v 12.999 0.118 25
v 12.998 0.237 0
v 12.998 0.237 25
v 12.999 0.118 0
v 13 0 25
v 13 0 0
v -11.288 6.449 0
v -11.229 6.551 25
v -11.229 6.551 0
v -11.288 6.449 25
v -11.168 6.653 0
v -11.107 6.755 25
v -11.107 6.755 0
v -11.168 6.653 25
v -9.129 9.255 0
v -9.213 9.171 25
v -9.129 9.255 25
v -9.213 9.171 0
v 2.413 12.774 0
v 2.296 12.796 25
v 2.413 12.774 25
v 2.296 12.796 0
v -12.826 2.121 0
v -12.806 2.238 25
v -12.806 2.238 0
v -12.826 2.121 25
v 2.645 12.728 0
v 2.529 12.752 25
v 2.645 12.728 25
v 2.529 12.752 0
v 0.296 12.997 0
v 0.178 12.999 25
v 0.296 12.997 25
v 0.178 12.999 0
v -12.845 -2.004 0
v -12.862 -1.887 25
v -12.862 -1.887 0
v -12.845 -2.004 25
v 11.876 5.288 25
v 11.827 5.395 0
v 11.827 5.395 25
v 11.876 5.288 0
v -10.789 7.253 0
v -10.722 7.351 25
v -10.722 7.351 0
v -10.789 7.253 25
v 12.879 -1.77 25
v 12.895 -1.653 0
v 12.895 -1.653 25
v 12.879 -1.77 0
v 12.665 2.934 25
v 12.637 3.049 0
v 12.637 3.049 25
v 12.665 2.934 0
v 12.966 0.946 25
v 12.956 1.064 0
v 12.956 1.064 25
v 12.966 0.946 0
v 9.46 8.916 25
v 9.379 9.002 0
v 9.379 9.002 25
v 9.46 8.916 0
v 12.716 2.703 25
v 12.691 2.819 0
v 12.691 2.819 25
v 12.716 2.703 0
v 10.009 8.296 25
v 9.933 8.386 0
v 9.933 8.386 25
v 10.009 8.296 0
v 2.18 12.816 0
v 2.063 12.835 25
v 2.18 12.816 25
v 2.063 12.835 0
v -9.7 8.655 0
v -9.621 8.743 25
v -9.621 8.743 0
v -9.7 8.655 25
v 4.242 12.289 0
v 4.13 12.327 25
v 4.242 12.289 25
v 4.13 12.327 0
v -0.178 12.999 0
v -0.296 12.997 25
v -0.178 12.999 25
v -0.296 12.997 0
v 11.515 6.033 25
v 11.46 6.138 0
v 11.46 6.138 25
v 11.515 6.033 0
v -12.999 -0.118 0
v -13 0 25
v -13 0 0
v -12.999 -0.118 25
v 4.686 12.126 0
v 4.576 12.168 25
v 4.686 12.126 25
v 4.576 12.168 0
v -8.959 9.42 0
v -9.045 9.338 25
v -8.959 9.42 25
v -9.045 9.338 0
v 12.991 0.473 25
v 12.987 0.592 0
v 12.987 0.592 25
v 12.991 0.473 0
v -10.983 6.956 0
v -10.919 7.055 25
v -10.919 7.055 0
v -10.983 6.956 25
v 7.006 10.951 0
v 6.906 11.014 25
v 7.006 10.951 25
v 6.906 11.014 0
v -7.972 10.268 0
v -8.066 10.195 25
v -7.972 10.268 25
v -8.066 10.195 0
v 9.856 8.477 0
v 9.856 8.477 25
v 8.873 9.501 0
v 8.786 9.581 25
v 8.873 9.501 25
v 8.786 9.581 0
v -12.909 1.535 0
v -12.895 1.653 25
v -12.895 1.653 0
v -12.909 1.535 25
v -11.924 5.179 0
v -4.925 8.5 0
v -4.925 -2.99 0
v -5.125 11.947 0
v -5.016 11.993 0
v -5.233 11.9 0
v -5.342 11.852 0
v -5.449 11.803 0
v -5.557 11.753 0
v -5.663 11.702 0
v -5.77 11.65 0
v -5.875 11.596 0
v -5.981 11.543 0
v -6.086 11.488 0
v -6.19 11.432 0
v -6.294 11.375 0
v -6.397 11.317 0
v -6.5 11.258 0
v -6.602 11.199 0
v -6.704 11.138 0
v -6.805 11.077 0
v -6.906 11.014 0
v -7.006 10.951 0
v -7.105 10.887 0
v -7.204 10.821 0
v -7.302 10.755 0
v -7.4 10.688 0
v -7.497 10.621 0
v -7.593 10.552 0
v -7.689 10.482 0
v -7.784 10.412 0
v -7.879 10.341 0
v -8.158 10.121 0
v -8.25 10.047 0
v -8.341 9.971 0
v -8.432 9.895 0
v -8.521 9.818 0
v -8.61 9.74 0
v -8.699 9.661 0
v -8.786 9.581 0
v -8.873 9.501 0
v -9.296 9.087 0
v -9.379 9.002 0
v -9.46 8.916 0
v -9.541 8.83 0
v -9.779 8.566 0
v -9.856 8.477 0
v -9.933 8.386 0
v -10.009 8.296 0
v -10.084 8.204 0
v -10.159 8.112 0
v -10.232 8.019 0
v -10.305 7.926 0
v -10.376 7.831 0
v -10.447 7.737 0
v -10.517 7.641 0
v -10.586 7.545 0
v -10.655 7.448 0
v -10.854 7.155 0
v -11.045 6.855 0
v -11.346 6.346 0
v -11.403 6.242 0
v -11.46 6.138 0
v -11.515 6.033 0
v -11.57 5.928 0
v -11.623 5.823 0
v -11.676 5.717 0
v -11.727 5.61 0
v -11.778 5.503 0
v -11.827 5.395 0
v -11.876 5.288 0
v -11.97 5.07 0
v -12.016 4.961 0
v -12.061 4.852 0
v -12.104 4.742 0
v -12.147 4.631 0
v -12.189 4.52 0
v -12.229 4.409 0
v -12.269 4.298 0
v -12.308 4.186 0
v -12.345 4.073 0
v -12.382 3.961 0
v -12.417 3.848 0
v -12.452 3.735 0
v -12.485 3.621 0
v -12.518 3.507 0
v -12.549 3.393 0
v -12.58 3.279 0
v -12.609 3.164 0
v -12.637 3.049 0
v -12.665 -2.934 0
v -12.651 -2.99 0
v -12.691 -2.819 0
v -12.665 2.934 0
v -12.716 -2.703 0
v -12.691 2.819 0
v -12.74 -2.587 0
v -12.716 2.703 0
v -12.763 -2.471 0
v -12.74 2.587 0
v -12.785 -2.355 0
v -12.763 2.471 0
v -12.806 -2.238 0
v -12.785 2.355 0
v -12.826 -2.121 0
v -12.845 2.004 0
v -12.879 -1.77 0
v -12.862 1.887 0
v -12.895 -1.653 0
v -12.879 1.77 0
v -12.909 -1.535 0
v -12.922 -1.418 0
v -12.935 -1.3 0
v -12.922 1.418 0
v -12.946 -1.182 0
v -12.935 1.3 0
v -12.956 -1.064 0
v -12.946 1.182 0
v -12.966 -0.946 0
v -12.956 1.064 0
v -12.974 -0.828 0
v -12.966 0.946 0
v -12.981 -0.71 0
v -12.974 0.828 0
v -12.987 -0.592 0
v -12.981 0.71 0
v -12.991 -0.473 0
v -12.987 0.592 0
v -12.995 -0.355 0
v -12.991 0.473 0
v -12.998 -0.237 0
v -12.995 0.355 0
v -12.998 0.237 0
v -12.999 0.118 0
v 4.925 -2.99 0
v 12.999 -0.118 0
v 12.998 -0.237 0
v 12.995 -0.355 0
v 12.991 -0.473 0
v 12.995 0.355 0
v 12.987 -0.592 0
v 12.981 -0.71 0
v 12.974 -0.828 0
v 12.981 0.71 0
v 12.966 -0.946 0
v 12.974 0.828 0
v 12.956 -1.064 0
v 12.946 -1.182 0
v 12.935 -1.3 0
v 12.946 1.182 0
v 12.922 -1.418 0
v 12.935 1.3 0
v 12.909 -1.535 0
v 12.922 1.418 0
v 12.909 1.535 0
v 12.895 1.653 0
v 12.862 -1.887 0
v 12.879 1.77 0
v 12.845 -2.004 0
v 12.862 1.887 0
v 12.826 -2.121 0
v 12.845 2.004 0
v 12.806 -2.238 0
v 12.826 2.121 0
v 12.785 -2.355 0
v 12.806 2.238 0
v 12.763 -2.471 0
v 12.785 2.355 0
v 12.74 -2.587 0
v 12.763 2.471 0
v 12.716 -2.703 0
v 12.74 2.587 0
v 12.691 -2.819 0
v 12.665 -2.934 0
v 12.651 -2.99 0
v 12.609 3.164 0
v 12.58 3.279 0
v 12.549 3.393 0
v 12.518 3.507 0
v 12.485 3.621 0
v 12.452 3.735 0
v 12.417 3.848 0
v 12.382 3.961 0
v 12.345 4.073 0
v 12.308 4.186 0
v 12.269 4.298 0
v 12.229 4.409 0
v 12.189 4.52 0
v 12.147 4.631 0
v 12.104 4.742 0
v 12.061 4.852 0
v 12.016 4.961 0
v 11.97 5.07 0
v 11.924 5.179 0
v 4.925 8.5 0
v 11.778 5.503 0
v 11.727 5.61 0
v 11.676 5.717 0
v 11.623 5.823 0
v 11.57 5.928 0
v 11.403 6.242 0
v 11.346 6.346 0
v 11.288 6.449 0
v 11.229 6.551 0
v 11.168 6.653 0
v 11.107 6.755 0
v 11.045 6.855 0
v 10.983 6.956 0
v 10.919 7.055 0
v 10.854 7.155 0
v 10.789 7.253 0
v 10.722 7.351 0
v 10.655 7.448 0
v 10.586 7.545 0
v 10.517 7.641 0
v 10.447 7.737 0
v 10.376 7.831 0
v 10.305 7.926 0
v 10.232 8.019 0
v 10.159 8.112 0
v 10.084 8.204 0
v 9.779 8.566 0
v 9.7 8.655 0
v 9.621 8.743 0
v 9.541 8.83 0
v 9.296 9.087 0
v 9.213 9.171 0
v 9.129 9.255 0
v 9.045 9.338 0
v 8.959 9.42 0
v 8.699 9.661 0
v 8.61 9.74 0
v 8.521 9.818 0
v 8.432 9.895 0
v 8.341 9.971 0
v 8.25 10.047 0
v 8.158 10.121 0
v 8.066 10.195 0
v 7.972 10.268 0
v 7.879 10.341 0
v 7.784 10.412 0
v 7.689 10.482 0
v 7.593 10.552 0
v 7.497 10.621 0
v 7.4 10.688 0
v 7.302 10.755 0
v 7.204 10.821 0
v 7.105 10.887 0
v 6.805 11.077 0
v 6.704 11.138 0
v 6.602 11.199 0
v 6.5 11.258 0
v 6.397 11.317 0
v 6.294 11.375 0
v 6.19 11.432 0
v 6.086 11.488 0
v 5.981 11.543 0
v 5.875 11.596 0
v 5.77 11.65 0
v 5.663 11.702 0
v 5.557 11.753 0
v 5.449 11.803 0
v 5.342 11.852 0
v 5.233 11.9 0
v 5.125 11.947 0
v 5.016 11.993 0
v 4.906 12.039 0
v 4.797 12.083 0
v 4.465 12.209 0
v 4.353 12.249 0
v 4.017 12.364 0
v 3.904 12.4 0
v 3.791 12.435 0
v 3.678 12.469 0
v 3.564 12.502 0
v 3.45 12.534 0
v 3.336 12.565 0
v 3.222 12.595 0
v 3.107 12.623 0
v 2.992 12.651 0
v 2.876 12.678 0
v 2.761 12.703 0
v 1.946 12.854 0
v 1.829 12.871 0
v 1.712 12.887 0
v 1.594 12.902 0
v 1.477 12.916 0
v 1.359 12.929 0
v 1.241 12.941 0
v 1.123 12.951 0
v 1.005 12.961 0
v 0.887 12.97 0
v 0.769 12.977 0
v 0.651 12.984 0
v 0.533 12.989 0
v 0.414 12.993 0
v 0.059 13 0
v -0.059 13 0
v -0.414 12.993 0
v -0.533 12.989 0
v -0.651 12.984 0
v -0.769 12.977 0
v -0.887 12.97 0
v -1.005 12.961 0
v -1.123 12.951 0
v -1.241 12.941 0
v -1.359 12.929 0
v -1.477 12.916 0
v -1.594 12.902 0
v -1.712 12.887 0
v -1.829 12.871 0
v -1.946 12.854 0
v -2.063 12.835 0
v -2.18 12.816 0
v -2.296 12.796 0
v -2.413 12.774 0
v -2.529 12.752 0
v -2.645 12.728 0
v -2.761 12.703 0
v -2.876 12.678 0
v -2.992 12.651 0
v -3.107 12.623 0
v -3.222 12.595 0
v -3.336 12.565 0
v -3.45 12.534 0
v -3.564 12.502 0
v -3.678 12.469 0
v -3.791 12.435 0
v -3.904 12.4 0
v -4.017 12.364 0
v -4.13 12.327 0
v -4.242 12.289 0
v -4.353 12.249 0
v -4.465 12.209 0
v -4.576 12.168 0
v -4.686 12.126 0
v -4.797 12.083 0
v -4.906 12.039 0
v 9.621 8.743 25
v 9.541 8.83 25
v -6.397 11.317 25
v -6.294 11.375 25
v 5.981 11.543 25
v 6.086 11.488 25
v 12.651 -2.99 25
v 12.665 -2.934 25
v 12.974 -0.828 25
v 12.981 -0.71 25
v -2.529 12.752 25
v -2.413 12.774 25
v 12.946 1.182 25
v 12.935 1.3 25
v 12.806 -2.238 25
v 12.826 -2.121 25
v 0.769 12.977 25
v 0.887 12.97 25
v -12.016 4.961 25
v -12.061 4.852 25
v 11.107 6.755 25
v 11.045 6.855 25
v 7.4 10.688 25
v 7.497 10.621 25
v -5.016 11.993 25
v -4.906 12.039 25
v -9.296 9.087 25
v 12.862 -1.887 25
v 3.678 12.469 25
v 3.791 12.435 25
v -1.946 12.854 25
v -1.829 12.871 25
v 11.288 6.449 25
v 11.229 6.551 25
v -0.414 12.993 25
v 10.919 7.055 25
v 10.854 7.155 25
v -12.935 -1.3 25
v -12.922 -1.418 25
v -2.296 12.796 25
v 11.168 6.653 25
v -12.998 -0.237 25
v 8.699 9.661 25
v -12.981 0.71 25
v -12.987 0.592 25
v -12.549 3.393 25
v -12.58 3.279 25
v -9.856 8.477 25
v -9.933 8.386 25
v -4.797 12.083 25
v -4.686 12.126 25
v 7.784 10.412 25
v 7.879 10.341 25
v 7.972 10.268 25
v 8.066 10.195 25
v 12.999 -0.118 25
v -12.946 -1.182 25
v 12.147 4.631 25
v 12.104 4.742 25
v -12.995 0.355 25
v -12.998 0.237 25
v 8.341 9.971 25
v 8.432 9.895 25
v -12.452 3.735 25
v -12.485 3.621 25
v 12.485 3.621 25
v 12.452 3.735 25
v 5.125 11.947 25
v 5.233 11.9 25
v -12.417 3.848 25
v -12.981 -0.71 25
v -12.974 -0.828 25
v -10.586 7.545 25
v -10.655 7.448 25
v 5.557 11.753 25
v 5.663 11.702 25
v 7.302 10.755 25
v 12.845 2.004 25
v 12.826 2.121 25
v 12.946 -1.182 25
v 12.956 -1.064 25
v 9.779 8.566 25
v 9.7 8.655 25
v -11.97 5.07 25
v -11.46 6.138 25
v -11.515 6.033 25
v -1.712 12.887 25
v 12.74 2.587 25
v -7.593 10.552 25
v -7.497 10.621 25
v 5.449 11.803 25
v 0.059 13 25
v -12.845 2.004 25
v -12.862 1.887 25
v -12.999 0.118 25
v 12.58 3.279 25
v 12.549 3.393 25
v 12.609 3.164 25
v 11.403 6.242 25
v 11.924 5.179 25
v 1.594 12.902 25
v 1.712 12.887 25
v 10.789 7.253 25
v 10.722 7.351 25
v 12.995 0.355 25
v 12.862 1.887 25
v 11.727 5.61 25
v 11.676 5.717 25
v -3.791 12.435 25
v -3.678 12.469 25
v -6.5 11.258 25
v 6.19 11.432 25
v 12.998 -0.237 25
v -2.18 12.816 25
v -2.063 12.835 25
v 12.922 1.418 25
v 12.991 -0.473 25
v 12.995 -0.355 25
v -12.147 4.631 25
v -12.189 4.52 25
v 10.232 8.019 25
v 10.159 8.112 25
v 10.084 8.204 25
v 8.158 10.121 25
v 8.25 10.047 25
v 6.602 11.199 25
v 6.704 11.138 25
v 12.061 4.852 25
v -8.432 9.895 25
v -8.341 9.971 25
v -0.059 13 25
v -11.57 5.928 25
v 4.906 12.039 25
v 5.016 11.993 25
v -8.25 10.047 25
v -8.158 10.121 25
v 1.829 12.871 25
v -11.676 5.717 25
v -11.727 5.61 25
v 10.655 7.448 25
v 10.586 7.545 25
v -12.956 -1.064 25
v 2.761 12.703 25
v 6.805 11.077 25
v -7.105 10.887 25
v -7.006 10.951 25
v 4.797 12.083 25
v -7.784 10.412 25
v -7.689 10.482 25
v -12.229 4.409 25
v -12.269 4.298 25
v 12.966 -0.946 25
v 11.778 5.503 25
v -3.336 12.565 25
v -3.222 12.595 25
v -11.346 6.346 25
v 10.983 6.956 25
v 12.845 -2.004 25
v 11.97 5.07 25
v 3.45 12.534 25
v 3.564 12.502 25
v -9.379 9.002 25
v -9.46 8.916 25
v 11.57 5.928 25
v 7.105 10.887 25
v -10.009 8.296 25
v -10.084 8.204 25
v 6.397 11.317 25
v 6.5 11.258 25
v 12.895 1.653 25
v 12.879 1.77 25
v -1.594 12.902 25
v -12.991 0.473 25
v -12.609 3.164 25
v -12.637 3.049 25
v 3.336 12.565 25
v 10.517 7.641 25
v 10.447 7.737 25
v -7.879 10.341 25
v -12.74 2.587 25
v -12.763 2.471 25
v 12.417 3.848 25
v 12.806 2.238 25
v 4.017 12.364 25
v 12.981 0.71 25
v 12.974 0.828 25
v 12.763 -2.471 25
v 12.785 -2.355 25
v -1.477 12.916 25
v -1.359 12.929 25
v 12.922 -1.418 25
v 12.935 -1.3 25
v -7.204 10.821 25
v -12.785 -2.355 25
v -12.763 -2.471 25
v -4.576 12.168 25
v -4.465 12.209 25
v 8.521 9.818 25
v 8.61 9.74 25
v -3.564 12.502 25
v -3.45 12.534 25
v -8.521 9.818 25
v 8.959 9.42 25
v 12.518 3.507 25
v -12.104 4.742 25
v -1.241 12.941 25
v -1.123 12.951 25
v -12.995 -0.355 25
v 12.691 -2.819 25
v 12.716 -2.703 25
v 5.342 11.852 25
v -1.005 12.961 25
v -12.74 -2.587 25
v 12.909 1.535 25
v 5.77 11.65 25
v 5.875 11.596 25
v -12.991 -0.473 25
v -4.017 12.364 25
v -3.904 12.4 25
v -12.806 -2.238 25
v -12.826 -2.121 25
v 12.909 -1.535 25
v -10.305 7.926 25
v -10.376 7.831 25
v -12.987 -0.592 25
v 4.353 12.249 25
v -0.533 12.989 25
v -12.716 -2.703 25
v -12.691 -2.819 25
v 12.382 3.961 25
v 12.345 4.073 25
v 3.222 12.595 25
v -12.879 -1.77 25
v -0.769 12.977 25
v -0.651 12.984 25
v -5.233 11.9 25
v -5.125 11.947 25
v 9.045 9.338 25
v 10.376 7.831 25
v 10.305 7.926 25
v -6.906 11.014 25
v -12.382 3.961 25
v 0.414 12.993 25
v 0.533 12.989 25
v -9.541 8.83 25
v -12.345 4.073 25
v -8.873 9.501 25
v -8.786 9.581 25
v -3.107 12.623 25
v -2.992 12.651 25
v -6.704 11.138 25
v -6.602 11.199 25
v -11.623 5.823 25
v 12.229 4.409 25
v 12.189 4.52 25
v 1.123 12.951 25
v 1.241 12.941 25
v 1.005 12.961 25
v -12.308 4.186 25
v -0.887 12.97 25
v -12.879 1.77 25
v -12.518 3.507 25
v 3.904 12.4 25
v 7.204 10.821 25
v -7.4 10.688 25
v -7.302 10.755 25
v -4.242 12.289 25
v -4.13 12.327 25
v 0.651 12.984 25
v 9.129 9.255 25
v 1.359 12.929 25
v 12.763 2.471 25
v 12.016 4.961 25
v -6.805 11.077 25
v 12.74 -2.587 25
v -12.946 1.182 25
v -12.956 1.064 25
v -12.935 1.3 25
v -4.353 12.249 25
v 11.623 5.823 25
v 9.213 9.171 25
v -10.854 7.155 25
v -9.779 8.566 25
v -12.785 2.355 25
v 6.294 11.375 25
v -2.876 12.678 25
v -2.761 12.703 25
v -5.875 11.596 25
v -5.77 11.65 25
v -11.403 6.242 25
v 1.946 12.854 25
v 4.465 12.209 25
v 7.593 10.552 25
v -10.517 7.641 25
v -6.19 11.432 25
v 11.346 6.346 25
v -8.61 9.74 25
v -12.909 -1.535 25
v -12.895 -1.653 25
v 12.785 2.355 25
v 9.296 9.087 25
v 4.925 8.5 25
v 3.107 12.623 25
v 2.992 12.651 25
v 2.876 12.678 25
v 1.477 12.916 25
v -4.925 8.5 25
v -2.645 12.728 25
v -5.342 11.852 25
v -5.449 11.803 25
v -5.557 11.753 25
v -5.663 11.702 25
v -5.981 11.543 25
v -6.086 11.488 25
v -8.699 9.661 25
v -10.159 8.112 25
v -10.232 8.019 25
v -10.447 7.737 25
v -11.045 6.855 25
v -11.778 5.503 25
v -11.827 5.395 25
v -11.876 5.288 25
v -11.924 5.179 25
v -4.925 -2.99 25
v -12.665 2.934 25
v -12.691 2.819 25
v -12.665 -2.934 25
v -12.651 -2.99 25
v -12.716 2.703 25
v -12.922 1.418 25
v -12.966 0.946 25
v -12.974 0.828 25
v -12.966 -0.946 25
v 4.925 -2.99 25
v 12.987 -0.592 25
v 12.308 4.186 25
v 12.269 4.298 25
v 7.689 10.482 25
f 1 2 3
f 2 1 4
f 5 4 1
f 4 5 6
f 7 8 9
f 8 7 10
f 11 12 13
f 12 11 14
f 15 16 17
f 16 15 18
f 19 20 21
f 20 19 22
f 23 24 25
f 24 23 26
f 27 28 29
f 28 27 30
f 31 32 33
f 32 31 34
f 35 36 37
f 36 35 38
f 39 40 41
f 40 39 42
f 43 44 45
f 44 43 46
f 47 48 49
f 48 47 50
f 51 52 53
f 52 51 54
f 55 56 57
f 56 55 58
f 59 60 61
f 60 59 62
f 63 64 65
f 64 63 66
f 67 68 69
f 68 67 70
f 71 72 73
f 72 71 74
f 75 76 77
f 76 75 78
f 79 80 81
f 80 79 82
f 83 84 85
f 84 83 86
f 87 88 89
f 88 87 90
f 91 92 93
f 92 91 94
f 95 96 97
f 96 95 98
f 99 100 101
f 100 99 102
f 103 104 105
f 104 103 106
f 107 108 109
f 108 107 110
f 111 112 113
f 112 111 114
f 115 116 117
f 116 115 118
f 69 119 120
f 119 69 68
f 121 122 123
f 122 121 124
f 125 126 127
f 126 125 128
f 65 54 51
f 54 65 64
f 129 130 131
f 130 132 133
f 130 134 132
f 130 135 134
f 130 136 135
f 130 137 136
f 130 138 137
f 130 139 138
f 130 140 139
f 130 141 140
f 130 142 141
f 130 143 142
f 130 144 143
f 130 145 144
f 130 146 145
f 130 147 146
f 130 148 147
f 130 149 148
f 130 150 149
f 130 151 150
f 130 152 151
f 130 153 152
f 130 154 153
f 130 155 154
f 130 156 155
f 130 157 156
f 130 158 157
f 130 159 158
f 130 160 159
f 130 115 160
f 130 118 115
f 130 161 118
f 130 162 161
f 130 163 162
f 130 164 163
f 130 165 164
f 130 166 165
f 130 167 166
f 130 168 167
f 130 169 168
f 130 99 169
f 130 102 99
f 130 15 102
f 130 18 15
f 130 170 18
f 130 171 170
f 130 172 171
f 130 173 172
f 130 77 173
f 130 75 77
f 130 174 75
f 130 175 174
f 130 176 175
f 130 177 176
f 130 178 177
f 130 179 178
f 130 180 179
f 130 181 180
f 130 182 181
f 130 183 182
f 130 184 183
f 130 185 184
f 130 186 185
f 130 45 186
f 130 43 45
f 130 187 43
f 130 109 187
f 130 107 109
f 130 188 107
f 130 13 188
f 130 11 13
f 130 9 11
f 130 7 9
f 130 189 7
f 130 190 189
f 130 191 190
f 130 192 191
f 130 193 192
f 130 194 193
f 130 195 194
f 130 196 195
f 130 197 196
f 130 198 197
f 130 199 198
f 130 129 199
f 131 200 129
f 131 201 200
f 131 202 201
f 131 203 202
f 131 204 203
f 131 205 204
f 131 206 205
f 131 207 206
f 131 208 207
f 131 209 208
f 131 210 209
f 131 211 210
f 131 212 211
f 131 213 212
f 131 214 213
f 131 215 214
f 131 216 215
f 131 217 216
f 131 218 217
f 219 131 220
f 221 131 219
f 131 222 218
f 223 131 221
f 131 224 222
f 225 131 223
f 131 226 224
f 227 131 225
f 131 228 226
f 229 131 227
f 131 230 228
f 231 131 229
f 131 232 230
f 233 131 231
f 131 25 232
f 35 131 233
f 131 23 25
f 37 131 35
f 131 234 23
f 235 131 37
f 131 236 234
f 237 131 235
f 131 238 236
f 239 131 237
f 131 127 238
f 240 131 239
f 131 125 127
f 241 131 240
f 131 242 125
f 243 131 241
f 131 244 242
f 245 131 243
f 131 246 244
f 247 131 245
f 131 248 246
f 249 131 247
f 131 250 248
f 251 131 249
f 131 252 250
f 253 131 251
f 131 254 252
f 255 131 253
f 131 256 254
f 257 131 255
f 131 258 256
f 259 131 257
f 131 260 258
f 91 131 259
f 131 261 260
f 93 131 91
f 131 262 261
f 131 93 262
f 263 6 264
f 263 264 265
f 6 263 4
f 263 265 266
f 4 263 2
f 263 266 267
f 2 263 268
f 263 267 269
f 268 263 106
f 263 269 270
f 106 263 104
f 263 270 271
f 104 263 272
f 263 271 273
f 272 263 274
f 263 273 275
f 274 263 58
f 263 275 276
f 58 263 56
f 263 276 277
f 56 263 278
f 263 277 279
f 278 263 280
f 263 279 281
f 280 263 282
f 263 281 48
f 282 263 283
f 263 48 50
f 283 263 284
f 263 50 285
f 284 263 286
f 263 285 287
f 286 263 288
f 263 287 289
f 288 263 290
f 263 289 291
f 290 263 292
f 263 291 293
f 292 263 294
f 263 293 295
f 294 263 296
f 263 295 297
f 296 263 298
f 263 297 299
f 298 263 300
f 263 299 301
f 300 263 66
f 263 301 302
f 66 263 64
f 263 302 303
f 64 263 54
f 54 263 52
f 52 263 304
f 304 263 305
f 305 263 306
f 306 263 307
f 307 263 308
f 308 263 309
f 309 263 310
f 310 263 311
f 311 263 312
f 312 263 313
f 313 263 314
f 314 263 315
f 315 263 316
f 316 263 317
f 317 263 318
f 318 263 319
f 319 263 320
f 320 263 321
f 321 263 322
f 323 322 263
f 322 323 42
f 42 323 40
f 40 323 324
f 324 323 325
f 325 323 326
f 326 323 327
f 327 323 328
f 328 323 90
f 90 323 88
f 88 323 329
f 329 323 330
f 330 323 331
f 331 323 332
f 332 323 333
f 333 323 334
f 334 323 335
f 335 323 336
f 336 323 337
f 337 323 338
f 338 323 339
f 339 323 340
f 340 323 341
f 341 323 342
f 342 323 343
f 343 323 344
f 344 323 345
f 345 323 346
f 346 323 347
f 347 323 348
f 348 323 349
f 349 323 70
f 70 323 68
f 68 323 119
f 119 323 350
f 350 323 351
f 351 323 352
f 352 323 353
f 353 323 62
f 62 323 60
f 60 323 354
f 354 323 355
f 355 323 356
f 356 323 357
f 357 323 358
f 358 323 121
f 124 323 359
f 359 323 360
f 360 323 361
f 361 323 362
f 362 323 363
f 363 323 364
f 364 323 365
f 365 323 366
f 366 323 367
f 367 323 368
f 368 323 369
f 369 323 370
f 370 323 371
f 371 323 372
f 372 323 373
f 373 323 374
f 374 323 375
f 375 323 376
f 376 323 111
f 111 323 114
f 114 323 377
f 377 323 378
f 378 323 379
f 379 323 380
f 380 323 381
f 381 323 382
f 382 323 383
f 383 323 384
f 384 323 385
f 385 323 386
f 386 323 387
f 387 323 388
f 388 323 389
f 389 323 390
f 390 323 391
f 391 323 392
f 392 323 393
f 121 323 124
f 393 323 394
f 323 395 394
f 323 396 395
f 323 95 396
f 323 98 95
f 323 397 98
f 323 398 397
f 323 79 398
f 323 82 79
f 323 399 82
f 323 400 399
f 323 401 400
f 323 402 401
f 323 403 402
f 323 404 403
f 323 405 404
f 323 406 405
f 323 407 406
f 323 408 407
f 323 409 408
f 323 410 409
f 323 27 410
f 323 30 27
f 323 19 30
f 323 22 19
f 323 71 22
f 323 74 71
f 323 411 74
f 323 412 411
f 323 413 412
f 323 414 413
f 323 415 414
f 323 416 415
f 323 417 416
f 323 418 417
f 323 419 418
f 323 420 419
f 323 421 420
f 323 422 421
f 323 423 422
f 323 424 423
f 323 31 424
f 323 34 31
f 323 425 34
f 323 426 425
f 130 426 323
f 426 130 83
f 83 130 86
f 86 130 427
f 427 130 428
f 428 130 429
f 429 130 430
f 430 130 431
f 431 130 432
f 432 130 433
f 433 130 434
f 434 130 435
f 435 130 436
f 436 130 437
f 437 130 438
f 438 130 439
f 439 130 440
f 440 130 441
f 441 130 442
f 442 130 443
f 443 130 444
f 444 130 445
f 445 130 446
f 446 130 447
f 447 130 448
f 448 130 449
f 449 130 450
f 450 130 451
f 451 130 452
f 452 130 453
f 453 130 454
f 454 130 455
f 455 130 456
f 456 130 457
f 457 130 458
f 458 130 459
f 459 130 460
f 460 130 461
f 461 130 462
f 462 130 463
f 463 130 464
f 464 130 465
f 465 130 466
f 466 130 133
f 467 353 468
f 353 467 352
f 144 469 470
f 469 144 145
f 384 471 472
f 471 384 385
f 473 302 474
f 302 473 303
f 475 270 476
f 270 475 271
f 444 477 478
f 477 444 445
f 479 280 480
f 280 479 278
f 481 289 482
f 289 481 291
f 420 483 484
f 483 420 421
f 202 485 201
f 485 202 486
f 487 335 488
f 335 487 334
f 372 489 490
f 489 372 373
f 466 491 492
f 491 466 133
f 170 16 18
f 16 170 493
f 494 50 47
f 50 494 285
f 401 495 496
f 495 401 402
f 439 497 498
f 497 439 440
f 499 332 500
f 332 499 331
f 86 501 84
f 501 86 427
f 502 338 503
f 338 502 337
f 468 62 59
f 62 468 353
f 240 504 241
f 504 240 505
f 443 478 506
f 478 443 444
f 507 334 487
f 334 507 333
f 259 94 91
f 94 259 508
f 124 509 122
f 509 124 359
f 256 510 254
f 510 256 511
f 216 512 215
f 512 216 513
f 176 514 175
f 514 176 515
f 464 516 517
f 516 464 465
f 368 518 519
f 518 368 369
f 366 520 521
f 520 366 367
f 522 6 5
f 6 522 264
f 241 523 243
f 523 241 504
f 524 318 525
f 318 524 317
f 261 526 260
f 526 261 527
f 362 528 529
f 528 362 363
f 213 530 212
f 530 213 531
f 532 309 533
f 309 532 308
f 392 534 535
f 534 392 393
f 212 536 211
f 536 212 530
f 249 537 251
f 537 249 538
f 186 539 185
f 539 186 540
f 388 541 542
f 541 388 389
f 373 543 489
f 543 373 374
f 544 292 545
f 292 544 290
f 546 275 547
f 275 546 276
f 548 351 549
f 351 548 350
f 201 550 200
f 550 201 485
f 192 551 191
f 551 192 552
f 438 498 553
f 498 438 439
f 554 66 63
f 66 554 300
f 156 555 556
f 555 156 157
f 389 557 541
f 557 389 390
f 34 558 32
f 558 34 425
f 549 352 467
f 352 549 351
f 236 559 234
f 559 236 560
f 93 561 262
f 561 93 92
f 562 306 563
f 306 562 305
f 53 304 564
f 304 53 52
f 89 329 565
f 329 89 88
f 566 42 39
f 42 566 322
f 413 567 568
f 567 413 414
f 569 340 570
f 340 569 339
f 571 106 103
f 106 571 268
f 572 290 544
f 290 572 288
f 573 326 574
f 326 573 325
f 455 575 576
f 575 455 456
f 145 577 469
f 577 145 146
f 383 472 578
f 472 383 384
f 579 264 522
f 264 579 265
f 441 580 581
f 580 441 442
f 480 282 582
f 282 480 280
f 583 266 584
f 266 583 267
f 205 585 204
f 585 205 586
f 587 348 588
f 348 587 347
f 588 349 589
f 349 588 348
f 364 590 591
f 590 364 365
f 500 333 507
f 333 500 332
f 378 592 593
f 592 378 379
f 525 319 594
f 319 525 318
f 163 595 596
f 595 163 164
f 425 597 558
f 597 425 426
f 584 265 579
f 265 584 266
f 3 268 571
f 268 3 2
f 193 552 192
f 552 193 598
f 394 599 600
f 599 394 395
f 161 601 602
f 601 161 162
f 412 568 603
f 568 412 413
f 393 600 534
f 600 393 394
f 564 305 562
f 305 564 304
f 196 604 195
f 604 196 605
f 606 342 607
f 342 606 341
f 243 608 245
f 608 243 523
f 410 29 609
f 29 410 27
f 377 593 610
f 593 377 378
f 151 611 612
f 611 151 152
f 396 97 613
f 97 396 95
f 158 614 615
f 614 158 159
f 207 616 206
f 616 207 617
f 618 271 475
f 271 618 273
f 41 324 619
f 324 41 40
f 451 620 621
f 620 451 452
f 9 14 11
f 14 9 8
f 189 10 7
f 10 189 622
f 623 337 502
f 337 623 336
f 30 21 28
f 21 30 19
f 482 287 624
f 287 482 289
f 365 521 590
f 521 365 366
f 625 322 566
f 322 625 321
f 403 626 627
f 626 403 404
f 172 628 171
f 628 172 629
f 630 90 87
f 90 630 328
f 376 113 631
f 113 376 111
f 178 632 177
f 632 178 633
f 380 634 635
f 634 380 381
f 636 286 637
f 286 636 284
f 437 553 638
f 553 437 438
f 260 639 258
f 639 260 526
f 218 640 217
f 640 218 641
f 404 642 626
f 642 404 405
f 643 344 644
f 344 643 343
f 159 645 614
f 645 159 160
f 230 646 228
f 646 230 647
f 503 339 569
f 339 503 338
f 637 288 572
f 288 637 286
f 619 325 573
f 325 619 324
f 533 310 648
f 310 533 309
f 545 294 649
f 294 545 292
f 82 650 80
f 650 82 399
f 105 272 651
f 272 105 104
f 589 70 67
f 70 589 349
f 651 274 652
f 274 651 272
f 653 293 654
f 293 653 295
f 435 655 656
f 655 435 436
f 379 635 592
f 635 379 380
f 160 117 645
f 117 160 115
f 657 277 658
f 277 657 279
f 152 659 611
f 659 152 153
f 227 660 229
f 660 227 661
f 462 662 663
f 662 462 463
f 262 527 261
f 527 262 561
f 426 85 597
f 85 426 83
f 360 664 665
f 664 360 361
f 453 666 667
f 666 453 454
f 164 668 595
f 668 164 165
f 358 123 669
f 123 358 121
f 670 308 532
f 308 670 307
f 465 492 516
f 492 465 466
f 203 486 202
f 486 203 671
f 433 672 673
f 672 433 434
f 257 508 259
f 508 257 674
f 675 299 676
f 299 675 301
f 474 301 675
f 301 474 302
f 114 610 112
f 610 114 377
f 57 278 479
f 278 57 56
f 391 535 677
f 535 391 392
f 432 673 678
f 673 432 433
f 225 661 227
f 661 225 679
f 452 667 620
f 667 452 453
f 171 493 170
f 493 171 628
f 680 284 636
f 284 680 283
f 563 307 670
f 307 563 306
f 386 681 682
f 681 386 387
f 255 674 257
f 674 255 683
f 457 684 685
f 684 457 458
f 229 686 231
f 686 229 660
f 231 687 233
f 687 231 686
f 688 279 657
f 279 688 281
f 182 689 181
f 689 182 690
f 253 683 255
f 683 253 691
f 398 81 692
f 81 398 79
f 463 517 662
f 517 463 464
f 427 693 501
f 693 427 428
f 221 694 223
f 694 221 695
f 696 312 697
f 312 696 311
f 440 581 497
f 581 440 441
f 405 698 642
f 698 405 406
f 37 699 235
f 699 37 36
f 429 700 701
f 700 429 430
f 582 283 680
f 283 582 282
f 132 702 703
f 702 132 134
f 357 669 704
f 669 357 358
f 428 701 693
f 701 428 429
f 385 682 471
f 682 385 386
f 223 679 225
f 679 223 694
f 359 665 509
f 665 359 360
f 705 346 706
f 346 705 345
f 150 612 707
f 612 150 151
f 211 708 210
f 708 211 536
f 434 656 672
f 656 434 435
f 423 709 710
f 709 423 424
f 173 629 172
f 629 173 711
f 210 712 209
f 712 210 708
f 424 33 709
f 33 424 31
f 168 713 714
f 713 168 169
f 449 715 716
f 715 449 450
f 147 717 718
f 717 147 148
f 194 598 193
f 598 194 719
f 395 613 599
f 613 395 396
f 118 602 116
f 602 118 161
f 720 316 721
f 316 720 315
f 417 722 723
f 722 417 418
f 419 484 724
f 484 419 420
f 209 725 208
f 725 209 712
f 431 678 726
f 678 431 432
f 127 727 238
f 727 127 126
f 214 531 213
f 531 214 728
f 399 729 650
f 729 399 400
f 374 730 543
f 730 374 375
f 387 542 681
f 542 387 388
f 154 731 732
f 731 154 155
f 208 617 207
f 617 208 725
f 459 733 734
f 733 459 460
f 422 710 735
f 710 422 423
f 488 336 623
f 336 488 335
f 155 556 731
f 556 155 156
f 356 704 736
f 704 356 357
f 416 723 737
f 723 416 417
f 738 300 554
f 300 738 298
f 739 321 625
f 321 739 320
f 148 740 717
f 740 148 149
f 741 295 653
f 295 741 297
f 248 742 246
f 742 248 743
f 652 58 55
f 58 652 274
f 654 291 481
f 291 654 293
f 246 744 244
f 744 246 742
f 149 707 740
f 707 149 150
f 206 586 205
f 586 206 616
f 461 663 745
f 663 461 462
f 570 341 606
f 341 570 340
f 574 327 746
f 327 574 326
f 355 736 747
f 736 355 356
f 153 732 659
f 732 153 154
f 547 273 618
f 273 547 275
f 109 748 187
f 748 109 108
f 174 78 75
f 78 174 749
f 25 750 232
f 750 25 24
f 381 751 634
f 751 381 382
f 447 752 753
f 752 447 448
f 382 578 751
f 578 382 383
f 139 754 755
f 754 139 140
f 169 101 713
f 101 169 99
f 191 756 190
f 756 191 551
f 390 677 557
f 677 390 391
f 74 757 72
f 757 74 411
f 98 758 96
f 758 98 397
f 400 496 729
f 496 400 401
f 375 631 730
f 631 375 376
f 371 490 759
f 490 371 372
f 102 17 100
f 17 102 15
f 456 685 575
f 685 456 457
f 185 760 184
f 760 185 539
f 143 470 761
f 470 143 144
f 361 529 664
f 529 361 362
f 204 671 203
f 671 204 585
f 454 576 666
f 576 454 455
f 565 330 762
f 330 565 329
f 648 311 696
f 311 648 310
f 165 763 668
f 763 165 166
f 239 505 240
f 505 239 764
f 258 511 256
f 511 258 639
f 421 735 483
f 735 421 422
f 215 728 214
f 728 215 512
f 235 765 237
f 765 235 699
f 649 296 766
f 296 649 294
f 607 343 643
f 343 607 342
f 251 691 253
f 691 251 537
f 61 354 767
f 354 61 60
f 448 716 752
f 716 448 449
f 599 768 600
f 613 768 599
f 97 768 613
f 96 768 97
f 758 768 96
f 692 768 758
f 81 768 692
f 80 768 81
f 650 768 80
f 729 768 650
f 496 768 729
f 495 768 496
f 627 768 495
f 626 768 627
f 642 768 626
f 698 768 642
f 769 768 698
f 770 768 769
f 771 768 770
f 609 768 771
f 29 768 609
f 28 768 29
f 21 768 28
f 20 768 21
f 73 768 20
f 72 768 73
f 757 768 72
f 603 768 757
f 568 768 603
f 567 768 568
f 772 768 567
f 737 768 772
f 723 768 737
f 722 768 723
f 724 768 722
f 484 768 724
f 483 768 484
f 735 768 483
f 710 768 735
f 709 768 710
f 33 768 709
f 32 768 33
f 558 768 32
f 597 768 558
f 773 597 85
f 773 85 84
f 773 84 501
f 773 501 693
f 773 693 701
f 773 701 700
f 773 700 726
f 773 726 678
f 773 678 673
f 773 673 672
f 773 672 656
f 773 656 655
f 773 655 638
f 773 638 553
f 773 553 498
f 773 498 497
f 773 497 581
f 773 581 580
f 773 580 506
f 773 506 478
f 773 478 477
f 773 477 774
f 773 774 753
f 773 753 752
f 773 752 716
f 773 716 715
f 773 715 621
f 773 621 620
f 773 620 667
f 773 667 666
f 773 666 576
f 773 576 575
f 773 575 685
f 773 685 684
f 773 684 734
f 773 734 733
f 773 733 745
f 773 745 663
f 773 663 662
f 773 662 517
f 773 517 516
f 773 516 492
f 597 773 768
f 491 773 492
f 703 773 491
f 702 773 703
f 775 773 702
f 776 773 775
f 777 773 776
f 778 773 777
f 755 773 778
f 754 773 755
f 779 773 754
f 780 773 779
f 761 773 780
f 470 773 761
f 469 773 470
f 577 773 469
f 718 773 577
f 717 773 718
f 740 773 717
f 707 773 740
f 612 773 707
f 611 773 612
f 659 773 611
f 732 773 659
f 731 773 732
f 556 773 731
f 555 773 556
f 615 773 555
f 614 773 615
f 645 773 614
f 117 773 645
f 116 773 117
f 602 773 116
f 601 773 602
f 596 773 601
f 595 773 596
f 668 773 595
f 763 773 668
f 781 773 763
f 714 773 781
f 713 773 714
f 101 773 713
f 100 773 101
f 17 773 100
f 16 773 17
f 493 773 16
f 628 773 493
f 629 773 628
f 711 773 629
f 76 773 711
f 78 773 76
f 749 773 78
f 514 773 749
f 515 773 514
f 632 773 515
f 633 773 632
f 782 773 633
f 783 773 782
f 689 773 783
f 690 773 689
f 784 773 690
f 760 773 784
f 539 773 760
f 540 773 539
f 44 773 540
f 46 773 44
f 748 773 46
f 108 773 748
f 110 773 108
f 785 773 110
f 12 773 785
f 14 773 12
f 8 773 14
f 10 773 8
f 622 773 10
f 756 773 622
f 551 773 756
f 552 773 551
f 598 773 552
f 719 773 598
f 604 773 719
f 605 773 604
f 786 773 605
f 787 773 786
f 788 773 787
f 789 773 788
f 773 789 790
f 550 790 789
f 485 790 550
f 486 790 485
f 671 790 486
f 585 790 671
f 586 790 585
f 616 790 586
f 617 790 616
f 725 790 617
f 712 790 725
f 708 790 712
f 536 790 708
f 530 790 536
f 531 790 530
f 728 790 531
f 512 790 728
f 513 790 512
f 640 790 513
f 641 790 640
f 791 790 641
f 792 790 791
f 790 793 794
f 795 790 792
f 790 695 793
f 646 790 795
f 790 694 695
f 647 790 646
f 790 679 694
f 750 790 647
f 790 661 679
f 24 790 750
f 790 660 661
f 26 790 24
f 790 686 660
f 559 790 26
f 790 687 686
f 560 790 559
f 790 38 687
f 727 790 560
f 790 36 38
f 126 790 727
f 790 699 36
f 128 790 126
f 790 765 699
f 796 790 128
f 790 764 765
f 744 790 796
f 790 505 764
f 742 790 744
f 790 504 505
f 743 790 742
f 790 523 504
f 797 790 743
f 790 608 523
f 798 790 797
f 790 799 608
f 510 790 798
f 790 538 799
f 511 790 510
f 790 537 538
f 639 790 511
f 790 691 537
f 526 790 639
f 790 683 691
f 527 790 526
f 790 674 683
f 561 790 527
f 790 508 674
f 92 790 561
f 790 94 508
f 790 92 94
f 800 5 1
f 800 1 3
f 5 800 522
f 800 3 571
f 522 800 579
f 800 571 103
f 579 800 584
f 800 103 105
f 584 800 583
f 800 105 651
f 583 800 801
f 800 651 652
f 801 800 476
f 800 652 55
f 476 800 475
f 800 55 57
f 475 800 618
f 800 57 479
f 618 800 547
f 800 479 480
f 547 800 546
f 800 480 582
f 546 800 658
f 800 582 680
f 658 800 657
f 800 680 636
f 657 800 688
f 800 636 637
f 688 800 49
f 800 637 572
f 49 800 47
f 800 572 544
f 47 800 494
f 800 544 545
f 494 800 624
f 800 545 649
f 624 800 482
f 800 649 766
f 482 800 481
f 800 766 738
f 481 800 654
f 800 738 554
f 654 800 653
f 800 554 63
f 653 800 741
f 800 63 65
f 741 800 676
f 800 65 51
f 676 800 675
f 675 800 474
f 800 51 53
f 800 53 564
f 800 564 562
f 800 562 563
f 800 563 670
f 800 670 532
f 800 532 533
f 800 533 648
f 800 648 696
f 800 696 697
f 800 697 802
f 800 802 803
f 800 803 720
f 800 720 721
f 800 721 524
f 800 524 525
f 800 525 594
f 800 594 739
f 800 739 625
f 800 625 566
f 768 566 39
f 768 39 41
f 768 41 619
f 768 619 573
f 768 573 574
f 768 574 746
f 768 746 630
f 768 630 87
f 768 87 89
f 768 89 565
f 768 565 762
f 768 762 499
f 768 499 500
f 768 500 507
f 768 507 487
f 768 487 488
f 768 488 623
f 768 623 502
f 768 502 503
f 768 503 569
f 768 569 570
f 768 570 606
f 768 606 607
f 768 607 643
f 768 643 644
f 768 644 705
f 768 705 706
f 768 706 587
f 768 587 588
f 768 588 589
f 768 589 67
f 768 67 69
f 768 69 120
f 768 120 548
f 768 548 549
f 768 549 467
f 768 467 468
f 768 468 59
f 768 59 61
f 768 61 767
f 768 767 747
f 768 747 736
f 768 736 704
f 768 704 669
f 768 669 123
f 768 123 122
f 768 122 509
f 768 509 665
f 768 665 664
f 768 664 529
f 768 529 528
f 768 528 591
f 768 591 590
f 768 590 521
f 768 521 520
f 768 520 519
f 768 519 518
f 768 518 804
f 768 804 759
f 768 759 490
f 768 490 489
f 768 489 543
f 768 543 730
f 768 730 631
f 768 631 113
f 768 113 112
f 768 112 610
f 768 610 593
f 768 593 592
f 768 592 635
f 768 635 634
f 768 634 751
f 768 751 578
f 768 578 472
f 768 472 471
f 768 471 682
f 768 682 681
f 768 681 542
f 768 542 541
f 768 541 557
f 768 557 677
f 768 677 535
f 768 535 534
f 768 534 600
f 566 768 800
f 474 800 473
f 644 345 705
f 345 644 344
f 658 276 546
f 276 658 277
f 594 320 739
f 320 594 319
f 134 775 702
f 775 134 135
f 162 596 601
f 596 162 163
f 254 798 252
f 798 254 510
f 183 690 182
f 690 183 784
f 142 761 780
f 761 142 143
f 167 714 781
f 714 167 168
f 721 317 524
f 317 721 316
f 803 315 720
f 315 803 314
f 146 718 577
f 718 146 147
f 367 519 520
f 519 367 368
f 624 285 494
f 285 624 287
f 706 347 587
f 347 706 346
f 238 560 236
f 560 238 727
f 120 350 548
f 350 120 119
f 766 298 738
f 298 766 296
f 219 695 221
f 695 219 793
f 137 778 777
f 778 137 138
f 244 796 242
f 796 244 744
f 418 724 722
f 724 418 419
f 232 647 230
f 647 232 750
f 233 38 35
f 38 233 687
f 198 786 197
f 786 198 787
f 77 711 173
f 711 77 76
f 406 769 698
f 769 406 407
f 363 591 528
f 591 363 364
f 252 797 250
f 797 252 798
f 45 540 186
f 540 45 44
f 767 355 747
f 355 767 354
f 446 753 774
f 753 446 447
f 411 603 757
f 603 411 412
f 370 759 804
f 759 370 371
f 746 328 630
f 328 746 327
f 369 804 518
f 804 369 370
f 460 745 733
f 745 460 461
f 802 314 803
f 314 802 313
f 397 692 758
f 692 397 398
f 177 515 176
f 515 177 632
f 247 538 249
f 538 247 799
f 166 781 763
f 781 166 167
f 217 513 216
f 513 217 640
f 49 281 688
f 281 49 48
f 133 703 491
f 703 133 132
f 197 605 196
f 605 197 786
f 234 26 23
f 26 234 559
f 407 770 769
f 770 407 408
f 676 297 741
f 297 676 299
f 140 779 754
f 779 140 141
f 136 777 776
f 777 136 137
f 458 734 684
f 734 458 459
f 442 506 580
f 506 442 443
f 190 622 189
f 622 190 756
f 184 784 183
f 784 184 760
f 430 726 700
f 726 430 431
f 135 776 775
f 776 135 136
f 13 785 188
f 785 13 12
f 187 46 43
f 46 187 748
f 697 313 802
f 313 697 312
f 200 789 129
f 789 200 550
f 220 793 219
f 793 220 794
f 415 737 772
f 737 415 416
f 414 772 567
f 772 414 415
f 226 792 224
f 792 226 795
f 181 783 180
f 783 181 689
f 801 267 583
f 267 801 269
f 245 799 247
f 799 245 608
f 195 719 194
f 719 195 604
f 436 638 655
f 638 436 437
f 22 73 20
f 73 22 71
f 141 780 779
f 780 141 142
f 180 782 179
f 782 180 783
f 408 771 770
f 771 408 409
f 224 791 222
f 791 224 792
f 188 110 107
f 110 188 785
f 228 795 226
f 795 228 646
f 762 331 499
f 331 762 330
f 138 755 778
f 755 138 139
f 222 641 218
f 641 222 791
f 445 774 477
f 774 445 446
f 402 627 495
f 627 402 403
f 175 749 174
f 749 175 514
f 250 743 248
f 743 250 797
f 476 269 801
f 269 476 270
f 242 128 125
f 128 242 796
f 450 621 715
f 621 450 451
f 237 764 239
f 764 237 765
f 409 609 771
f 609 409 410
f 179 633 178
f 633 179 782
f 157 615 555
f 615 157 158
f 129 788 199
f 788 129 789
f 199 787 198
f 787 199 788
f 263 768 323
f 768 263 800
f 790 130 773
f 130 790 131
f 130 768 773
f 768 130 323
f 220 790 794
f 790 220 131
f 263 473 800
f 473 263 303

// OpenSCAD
eps = 0.01;
$fn = 690;

x = 9.85;
y = 23;
z = 25;

difference()
{
    cylinder(d=26,h=25);
    translate([-x/2,-3,-eps])
        cube([x,y/2,z+2*eps]);
    _a = 100;
    translate([-_a/2,-_a-3+eps,-_a/2])
        cube([_a,_a,_a]);
}
